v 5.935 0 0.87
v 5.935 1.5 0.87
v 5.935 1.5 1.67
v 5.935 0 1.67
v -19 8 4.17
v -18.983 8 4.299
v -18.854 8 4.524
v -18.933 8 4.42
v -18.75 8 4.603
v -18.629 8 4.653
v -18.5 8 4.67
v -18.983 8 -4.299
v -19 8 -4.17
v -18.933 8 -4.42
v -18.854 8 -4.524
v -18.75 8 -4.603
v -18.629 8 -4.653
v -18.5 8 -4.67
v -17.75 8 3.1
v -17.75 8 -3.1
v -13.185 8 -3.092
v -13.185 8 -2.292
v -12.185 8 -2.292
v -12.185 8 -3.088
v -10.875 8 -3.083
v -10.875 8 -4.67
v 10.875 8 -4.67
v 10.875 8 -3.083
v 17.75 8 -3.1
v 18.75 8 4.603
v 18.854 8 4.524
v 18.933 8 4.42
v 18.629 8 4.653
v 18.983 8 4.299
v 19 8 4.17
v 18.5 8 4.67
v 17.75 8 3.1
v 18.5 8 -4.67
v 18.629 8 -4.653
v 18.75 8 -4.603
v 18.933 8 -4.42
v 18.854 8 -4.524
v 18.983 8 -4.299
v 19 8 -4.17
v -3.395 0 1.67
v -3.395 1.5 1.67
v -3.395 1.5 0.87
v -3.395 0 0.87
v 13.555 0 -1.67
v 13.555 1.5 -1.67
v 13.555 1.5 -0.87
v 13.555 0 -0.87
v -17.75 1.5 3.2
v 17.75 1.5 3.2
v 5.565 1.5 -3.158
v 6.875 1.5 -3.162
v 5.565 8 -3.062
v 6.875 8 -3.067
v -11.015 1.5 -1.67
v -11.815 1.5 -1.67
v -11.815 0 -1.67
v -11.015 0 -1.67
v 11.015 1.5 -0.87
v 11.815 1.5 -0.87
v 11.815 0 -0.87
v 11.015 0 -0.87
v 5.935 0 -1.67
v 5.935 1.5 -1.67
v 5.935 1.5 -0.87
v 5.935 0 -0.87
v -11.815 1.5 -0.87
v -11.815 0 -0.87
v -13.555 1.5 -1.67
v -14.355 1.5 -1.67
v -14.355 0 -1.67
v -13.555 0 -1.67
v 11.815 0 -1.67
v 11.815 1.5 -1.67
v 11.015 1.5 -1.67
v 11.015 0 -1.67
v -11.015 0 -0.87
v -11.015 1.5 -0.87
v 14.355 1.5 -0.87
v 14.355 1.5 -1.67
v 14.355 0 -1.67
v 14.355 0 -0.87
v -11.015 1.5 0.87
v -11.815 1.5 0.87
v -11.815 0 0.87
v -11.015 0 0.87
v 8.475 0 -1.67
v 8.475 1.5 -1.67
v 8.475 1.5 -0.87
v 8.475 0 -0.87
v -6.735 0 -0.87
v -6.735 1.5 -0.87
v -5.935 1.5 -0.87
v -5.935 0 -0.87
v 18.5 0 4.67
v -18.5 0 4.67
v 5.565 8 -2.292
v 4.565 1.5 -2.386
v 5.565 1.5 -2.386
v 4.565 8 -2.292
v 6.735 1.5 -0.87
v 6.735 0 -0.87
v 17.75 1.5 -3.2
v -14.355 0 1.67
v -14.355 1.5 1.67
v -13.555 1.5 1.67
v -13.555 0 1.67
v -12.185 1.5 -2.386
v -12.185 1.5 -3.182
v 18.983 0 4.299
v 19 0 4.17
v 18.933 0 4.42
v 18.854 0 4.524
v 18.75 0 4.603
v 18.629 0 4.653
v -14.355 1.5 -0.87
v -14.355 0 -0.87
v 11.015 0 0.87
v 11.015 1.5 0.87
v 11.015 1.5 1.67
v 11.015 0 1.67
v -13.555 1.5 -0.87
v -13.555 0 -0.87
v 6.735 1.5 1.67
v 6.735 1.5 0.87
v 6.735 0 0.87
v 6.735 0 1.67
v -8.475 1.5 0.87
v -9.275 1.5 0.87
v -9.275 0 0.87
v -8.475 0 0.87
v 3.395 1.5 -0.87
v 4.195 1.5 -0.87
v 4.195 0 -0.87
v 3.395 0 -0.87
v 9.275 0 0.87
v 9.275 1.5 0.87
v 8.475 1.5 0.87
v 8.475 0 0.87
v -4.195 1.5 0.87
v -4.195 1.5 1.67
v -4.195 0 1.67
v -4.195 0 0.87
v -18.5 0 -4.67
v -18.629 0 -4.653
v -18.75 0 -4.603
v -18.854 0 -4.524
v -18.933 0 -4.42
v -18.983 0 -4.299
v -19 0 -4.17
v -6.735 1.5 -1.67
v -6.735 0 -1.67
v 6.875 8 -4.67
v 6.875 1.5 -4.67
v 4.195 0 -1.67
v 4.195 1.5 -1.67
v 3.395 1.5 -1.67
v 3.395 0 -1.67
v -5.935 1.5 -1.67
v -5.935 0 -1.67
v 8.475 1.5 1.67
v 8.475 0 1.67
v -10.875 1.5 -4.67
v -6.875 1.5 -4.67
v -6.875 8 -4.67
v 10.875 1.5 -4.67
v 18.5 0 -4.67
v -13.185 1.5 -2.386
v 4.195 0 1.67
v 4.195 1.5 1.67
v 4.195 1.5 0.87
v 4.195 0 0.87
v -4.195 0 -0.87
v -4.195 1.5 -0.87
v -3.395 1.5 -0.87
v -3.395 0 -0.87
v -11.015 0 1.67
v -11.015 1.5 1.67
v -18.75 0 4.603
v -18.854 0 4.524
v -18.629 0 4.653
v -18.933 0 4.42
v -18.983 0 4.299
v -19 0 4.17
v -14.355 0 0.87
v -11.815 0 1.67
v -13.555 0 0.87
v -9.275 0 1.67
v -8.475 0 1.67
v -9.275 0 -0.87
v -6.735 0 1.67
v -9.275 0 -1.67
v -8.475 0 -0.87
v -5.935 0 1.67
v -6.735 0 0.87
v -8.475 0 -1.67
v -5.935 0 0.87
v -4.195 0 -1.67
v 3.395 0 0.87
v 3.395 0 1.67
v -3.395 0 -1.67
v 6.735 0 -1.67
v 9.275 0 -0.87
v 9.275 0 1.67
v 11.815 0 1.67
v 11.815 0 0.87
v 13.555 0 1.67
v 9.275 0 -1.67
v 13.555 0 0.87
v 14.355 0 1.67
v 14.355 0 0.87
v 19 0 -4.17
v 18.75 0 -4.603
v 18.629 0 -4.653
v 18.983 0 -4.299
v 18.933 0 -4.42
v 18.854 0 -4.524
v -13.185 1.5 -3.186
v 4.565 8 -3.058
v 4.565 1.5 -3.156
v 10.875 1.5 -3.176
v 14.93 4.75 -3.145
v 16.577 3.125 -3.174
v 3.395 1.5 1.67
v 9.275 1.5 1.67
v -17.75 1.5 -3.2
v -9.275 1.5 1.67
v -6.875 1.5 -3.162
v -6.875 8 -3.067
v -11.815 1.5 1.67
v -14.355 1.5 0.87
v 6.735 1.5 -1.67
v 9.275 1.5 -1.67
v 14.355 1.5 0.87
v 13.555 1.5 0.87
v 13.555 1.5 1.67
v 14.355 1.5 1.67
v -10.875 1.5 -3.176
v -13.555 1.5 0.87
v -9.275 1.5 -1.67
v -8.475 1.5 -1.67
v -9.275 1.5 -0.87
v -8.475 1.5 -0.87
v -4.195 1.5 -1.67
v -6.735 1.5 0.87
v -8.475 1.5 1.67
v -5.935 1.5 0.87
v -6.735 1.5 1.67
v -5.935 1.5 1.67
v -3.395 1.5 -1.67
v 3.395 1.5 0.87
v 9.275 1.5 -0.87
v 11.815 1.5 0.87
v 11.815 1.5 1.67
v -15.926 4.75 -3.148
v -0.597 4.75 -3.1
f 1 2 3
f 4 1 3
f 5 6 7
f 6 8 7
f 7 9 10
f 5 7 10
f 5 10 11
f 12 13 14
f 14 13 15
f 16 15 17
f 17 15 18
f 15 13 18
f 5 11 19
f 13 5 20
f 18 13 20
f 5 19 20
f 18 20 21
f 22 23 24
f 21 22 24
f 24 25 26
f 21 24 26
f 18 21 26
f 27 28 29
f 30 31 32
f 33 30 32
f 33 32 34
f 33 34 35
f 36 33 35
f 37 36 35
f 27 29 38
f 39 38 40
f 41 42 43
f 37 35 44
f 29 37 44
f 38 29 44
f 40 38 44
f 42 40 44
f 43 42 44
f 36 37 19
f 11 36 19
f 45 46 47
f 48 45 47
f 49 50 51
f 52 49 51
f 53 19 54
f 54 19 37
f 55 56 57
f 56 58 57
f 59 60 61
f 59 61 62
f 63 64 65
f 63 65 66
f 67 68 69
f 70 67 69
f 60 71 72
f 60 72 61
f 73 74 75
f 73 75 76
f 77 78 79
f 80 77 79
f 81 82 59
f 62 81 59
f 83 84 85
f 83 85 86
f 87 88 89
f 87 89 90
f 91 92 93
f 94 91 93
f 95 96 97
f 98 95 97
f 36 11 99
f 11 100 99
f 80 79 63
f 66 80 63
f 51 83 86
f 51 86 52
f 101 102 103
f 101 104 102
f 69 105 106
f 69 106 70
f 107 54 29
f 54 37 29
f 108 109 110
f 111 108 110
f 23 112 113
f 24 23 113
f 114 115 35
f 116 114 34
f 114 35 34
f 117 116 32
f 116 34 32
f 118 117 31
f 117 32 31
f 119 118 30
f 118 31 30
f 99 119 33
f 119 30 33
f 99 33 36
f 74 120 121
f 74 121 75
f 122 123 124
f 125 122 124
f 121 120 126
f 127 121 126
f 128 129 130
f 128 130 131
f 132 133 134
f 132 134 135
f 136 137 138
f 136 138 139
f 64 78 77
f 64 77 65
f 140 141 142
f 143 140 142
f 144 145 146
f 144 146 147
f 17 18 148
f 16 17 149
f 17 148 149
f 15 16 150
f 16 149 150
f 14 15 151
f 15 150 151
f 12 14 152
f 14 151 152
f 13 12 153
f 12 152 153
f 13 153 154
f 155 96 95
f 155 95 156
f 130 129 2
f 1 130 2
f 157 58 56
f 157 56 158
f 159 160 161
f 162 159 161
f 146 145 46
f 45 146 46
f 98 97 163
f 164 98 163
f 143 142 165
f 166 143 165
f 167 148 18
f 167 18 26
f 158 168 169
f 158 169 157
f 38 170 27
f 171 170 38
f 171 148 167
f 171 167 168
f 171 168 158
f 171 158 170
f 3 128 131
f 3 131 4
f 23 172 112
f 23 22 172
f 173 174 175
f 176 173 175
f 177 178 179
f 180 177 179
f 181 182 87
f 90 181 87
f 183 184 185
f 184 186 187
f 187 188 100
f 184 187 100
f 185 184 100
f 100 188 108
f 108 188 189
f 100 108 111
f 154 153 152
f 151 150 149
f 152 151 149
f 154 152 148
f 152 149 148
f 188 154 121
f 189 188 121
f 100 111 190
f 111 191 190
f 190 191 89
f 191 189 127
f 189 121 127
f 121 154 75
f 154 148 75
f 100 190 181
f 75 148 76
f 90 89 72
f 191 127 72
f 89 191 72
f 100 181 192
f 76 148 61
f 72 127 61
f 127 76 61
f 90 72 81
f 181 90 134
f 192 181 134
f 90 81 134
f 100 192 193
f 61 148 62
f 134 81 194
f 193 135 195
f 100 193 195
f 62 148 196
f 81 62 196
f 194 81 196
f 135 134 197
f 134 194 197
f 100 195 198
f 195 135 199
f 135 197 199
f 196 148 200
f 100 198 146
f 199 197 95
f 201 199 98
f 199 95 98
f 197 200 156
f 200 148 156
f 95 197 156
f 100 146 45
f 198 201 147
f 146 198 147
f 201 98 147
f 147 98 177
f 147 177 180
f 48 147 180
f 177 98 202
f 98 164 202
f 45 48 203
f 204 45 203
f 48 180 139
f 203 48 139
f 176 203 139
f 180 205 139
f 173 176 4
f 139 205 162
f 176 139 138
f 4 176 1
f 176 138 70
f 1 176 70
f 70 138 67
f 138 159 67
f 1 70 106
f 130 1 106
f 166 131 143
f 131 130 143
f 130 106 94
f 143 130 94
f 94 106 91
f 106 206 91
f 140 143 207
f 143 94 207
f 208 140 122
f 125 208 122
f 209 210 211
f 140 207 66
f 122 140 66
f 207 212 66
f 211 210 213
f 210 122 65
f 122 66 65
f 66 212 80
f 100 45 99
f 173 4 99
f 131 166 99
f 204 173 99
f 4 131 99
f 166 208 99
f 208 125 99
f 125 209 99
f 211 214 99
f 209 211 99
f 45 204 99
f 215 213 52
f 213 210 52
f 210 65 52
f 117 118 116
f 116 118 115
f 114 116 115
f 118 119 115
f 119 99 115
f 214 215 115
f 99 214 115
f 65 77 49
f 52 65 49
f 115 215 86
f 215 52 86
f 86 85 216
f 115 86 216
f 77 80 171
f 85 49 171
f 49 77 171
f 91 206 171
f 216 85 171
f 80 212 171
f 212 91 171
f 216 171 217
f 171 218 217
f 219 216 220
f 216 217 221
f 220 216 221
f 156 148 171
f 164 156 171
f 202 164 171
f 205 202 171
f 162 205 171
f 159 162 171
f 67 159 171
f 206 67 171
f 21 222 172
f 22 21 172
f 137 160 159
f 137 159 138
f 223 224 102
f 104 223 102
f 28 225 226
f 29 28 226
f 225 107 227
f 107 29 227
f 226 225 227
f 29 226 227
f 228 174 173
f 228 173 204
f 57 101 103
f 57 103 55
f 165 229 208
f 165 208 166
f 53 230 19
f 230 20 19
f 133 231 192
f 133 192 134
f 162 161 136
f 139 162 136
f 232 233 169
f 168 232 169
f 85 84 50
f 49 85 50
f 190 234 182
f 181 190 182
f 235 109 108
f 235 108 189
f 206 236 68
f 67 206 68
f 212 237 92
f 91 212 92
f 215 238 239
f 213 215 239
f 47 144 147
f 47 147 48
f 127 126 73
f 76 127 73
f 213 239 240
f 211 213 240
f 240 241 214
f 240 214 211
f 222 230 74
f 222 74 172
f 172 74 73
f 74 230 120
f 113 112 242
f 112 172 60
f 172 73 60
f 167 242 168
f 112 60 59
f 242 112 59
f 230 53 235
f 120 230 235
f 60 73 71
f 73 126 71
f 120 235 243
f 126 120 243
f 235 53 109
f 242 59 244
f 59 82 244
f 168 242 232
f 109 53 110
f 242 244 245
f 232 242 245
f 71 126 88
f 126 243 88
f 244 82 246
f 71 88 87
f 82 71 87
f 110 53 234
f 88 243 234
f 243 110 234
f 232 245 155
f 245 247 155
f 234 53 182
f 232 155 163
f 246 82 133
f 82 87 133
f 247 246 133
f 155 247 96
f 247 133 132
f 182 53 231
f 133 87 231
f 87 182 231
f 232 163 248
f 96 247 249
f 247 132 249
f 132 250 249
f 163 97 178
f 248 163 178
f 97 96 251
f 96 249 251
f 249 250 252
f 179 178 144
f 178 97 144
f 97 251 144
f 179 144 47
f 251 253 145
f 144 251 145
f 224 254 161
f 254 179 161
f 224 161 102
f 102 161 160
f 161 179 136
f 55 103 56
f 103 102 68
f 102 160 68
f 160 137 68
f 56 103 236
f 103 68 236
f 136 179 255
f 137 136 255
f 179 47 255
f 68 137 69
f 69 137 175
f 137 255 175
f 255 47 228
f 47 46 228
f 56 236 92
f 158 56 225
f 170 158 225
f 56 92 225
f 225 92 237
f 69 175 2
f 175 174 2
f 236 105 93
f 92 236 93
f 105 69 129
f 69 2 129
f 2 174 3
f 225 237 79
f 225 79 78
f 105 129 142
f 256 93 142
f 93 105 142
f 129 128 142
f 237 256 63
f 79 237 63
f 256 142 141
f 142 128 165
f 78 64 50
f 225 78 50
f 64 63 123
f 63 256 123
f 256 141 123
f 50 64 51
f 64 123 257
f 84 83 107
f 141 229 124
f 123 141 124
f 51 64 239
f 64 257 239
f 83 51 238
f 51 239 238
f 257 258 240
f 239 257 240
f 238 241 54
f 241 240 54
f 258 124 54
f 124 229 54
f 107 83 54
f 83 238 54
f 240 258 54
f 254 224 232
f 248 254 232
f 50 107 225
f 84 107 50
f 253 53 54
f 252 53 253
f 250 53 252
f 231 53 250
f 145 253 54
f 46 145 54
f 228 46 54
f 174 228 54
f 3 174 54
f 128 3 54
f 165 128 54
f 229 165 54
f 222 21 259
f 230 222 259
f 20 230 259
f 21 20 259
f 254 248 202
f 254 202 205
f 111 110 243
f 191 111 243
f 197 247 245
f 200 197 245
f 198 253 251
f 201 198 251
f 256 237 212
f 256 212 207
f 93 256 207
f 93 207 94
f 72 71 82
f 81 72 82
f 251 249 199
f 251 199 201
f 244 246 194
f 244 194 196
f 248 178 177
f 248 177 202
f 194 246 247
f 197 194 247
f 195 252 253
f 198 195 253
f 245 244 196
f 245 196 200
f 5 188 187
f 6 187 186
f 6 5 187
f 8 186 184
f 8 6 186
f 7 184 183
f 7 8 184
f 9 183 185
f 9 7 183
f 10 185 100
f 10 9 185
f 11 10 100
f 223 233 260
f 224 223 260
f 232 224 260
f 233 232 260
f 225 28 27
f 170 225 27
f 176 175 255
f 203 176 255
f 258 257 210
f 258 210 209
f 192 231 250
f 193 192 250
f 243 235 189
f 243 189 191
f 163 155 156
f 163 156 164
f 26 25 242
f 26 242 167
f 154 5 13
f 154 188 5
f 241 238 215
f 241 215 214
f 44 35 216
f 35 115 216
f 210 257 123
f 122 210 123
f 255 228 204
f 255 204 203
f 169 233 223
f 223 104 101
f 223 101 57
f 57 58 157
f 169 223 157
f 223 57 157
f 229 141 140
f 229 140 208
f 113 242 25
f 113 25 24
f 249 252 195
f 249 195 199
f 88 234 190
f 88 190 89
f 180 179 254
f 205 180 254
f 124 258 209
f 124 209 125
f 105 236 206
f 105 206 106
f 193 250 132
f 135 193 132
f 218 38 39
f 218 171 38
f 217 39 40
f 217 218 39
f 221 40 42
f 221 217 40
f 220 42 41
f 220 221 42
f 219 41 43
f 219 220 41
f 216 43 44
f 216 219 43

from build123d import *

# Parameters (mm, degrees)
SKETCH15_W              = 38
SKETCH15_H              = 9.34
BOSS_EXTRUDE11_DEPTH    = 1.5
SKETCH16_W              = 38
SKETCH16_H              = 9.34
BOSS_EXTRUDE12_DEPTH    = 6.5
LPATTERN2_COUNT         = 2
LPATTERN2_PITCH         = 17.75
SKETCH10_W              = 4
SKETCH10_H              = 2
CUT_EXTRUDE2_DEPTH      = 6.5
SKETCH2_W               = 0.8
SKETCH2_H               = 0.8
CUT_EXTRUDE1_DEPTH      = 21.61695676
LPATTERN1_COUNT         = 5
LPATTERN1_PITCH         = 2.54
LPATTERN1_COUNT_DIR2    = 2
LPATTERN1_PITCH_DIR2    = 2.54
MIRROR1_COPY_1_SKETCH_W = 0.8
MIRROR1_COPY_1_SKETCH_H = 0.8
MIRROR1_COPY_1_DEPTH    = 21.61695676
MIRROR1_COPY_2_SKETCH_W = 0.8
MIRROR1_COPY_2_SKETCH_H = 0.8
MIRROR1_COPY_2_DEPTH    = 21.61695676
MIRROR1_COPY_3_SKETCH_W = 0.8
MIRROR1_COPY_3_SKETCH_H = 0.8
MIRROR1_COPY_3_DEPTH    = 21.61695676
MIRROR1_COPY_4_SKETCH_W = 0.8
MIRROR1_COPY_4_SKETCH_H = 0.8
MIRROR1_COPY_4_DEPTH    = 21.61695676
MIRROR1_COPY_5_SKETCH_W = 0.8
MIRROR1_COPY_5_SKETCH_H = 0.8
MIRROR1_COPY_5_DEPTH    = 21.61695676
MIRROR1_COPY_6_SKETCH_W = 0.8
MIRROR1_COPY_6_SKETCH_H = 0.8
MIRROR1_COPY_6_DEPTH    = 21.61695676
MIRROR1_COPY_7_SKETCH_W = 0.8
MIRROR1_COPY_7_SKETCH_H = 0.8
MIRROR1_COPY_7_DEPTH    = 21.61695676
MIRROR1_COPY_8_SKETCH_W = 0.8
MIRROR1_COPY_8_SKETCH_H = 0.8
MIRROR1_COPY_8_DEPTH    = 21.61695676
MIRROR1_COPY_9_SKETCH_W = 0.8
MIRROR1_COPY_9_SKETCH_H = 0.8
MIRROR1_COPY_9_DEPTH    = 21.61695676
FILLET6_R               = 0.5


with BuildPart() as part:
    # Sketch15 → Boss-Extrude11 (new body)
    with BuildSketch(Plane(origin=(0, 0, 0), x_dir=(1, 0, 0), z_dir=(0, 1, 0))):
        Rectangle(SKETCH15_W, SKETCH15_H)
    extrude(amount=BOSS_EXTRUDE11_DEPTH)

    # Sketch16 → Boss-Extrude12 (add)
    with BuildSketch(Plane(origin=(0, 1.5, 0), x_dir=(1, 0, 0), z_dir=(0, 1, 0))):
        Rectangle(SKETCH16_W, SKETCH16_H)
    extrude(amount=BOSS_EXTRUDE12_DEPTH)

    # Sketch5 → Cut-Loft1 section 0
    with BuildSketch(Plane(origin=(0, 1.5, 0), x_dir=(1, 0, 0), z_dir=(0, 1, 0))):
        with BuildLine():
            Line((-17.75, 3.2), (-17.75, -3.2))
            add(Edge.make_bspline(
                [(-17.75, -3.2), (-14.75, -3.2), (0, -3.1), (14.75, -3.2), (17.75, -3.2)],
                knots=[0, 0, 0, 0, 0.5, 1, 1, 1, 1], degree=3))
            Line((17.75, -3.2), (17.75, 3.2))
            add(Edge.make_bspline(
                [(-17.75, 3.2), (-14.75, 3.2), (0, 3.1), (14.75, 3.2), (17.75, 3.2)],
                knots=[0, 0, 0, 0, 0.5, 1, 1, 1, 1], degree=3))
        make_face()
    # Sketch6 → Cut-Loft1 section 1
    with BuildSketch(Plane(origin=(0, 8, 0), x_dir=(1, 0, 0), z_dir=(0, 1, 0))):
        with BuildLine():
            Line((-17.75, 3.1), (-17.75, -3.1))
            add(Edge.make_bspline(
                [(-17.75, -3.1), (-11.833239437, -3.1), (0.000187784, -3), (11.832863868, -3.1), (17.75, -3.1)],
                knots=[0, 0, 0, 0, 0.5, 1, 1, 1, 1], degree=3))
            Line((17.75, -3.1), (17.75, 3.1))
            add(Edge.make_bspline(
                [(-17.75, 3.1), (-11.833239437, 3.1), (0.000187784, 3), (11.832863868, 3.1), (17.75, 3.1)],
                knots=[0, 0, 0, 0, 0.5, 1, 1, 1, 1], degree=3))
        make_face()
    loft(mode=Mode.SUBTRACT)

    # Sketch8 → Loft1 section 0
    with BuildSketch(Plane(origin=(0, 1.5, 0), x_dir=(1, 0, 0), z_dir=(0, 1, 0))):
        with BuildLine():
            Line((-13.185, 2.385934046), (-12.185, 2.385934046))
            Line((-12.185, 2.385934046), (-12.185, 3.585934046))
            Line((-12.185, 3.585934046), (-13.185, 3.585934046))
            Line((-13.185, 3.585934046), (-13.185, 2.385934046))
        make_face()
    # Sketch9 → Loft1 section 1
    with BuildSketch(Plane(origin=(0, 8, 0), x_dir=(1, 0, 0), z_dir=(0, 1, 0))):
        with BuildLine():
            Line((-13.185, 3.491779814), (-13.185, 2.291779814))
            Line((-13.185, 2.291779814), (-12.185, 2.291779814))
            Line((-12.185, 2.291779814), (-12.185, 3.491779814))
            Line((-12.185, 3.491779814), (-13.185, 3.491779814))
        make_face()
    loft1 = loft()

    # LPattern2: Loft1 ×2
    with Locations(*[(i * LPATTERN2_PITCH, 0, 0) for i in range(1, LPATTERN2_COUNT)]):
        add(loft1)

    # Sketch10 → Cut-Extrude2 (cut)
    with BuildSketch(Plane(origin=(0, 8, 0), x_dir=(1, 0, 0), z_dir=(0, 1, 0))):
        with Locations((-8.875, 3.67)):
            Rectangle(SKETCH10_W, SKETCH10_H)
        with Locations((8.875, 3.67)):
            Rectangle(SKETCH10_W, SKETCH10_H)
    extrude(amount=-CUT_EXTRUDE2_DEPTH, mode=Mode.SUBTRACT)

    # Sketch2 → Cut-Extrude1 (cut, through all)
    with BuildSketch(Plane(origin=(0, 1.5, 0), x_dir=(1, 0, 0), z_dir=(0, 1, 0))):
        with Locations((-3.795, -1.27)):
            Rectangle(SKETCH2_W, SKETCH2_H)
    cut_extrude1 = extrude(amount=-CUT_EXTRUDE1_DEPTH, mode=Mode.SUBTRACT)

    # LPattern1: Cut-Extrude1 5 × 2
    with Locations(*[(-i * LPATTERN1_PITCH, 0, -j * LPATTERN1_PITCH_DIR2) for i in range(LPATTERN1_COUNT) for j in range(LPATTERN1_COUNT_DIR2) if (i, j) != (0, 0)]):
        add(cut_extrude1, mode=Mode.SUBTRACT)

    # Mirror1: Cut-Extrude1 across plane
    add(cut_extrude1.mirror(Plane(origin=(0, 0, 0), x_dir=(0, 0, 1), z_dir=(1, 0, 0))), mode=Mode.SUBTRACT)

    # Mirror1 copy 1 sketch → Mirror1 copy 1 (cut, through all)
    with BuildSketch(Plane(origin=(0, 1.5, -2.54), x_dir=(-1, 0, 0), z_dir=(0, 1, 0))):
        with Locations((-3.795, 1.27)):
            Rectangle(MIRROR1_COPY_1_SKETCH_W, MIRROR1_COPY_1_SKETCH_H)
    extrude(amount=-MIRROR1_COPY_1_DEPTH, mode=Mode.SUBTRACT)

    # Mirror1 copy 2 sketch → Mirror1 copy 2 (cut, through all)
    with BuildSketch(Plane(origin=(2.54, 1.5, 0), x_dir=(-1, 0, 0), z_dir=(0, 1, 0))):
        with Locations((-3.795, 1.27)):
            Rectangle(MIRROR1_COPY_2_SKETCH_W, MIRROR1_COPY_2_SKETCH_H)
    extrude(amount=-MIRROR1_COPY_2_DEPTH, mode=Mode.SUBTRACT)

    # Mirror1 copy 3 sketch → Mirror1 copy 3 (cut, through all)
    with BuildSketch(Plane(origin=(2.54, 1.5, -2.54), x_dir=(-1, 0, 0), z_dir=(0, 1, 0))):
        with Locations((-3.795, 1.27)):
            Rectangle(MIRROR1_COPY_3_SKETCH_W, MIRROR1_COPY_3_SKETCH_H)
    extrude(amount=-MIRROR1_COPY_3_DEPTH, mode=Mode.SUBTRACT)

    # Mirror1 copy 4 sketch → Mirror1 copy 4 (cut, through all)
    with BuildSketch(Plane(origin=(5.08, 1.5, 0), x_dir=(-1, 0, 0), z_dir=(0, 1, 0))):
        with Locations((-3.795, 1.27)):
            Rectangle(MIRROR1_COPY_4_SKETCH_W, MIRROR1_COPY_4_SKETCH_H)
    extrude(amount=-MIRROR1_COPY_4_DEPTH, mode=Mode.SUBTRACT)

    # Mirror1 copy 5 sketch → Mirror1 copy 5 (cut, through all)
    with BuildSketch(Plane(origin=(5.08, 1.5, -2.54), x_dir=(-1, 0, 0), z_dir=(0, 1, 0))):
        with Locations((-3.795, 1.27)):
            Rectangle(MIRROR1_COPY_5_SKETCH_W, MIRROR1_COPY_5_SKETCH_H)
    extrude(amount=-MIRROR1_COPY_5_DEPTH, mode=Mode.SUBTRACT)

    # Mirror1 copy 6 sketch → Mirror1 copy 6 (cut, through all)
    with BuildSketch(Plane(origin=(7.62, 1.5, 0), x_dir=(-1, 0, 0), z_dir=(0, 1, 0))):
        with Locations((-3.795, 1.27)):
            Rectangle(MIRROR1_COPY_6_SKETCH_W, MIRROR1_COPY_6_SKETCH_H)
    extrude(amount=-MIRROR1_COPY_6_DEPTH, mode=Mode.SUBTRACT)

    # Mirror1 copy 7 sketch → Mirror1 copy 7 (cut, through all)
    with BuildSketch(Plane(origin=(7.62, 1.5, -2.54), x_dir=(-1, 0, 0), z_dir=(0, 1, 0))):
        with Locations((-3.795, 1.27)):
            Rectangle(MIRROR1_COPY_7_SKETCH_W, MIRROR1_COPY_7_SKETCH_H)
    extrude(amount=-MIRROR1_COPY_7_DEPTH, mode=Mode.SUBTRACT)

    # Mirror1 copy 8 sketch → Mirror1 copy 8 (cut, through all)
    with BuildSketch(Plane(origin=(10.16, 1.5, 0), x_dir=(-1, 0, 0), z_dir=(0, 1, 0))):
        with Locations((-3.795, 1.27)):
            Rectangle(MIRROR1_COPY_8_SKETCH_W, MIRROR1_COPY_8_SKETCH_H)
    extrude(amount=-MIRROR1_COPY_8_DEPTH, mode=Mode.SUBTRACT)

    # Mirror1 copy 9 sketch → Mirror1 copy 9 (cut, through all)
    with BuildSketch(Plane(origin=(10.16, 1.5, -2.54), x_dir=(-1, 0, 0), z_dir=(0, 1, 0))):
        with Locations((-3.795, 1.27)):
            Rectangle(MIRROR1_COPY_9_SKETCH_W, MIRROR1_COPY_9_SKETCH_H)
    extrude(amount=-MIRROR1_COPY_9_DEPTH, mode=Mode.SUBTRACT)

    # Fillet6
    fillet6_edges = [part.edges().sort_by_distance(p)[0] for p in [
        (-19, 4, -4.67),
        (19, 4, -4.67),
        (19, 4, 4.67),
        (-19, 4, 4.67),
    ]]
    fillet(fillet6_edges, radius=FILLET6_R)


solid = part.part
